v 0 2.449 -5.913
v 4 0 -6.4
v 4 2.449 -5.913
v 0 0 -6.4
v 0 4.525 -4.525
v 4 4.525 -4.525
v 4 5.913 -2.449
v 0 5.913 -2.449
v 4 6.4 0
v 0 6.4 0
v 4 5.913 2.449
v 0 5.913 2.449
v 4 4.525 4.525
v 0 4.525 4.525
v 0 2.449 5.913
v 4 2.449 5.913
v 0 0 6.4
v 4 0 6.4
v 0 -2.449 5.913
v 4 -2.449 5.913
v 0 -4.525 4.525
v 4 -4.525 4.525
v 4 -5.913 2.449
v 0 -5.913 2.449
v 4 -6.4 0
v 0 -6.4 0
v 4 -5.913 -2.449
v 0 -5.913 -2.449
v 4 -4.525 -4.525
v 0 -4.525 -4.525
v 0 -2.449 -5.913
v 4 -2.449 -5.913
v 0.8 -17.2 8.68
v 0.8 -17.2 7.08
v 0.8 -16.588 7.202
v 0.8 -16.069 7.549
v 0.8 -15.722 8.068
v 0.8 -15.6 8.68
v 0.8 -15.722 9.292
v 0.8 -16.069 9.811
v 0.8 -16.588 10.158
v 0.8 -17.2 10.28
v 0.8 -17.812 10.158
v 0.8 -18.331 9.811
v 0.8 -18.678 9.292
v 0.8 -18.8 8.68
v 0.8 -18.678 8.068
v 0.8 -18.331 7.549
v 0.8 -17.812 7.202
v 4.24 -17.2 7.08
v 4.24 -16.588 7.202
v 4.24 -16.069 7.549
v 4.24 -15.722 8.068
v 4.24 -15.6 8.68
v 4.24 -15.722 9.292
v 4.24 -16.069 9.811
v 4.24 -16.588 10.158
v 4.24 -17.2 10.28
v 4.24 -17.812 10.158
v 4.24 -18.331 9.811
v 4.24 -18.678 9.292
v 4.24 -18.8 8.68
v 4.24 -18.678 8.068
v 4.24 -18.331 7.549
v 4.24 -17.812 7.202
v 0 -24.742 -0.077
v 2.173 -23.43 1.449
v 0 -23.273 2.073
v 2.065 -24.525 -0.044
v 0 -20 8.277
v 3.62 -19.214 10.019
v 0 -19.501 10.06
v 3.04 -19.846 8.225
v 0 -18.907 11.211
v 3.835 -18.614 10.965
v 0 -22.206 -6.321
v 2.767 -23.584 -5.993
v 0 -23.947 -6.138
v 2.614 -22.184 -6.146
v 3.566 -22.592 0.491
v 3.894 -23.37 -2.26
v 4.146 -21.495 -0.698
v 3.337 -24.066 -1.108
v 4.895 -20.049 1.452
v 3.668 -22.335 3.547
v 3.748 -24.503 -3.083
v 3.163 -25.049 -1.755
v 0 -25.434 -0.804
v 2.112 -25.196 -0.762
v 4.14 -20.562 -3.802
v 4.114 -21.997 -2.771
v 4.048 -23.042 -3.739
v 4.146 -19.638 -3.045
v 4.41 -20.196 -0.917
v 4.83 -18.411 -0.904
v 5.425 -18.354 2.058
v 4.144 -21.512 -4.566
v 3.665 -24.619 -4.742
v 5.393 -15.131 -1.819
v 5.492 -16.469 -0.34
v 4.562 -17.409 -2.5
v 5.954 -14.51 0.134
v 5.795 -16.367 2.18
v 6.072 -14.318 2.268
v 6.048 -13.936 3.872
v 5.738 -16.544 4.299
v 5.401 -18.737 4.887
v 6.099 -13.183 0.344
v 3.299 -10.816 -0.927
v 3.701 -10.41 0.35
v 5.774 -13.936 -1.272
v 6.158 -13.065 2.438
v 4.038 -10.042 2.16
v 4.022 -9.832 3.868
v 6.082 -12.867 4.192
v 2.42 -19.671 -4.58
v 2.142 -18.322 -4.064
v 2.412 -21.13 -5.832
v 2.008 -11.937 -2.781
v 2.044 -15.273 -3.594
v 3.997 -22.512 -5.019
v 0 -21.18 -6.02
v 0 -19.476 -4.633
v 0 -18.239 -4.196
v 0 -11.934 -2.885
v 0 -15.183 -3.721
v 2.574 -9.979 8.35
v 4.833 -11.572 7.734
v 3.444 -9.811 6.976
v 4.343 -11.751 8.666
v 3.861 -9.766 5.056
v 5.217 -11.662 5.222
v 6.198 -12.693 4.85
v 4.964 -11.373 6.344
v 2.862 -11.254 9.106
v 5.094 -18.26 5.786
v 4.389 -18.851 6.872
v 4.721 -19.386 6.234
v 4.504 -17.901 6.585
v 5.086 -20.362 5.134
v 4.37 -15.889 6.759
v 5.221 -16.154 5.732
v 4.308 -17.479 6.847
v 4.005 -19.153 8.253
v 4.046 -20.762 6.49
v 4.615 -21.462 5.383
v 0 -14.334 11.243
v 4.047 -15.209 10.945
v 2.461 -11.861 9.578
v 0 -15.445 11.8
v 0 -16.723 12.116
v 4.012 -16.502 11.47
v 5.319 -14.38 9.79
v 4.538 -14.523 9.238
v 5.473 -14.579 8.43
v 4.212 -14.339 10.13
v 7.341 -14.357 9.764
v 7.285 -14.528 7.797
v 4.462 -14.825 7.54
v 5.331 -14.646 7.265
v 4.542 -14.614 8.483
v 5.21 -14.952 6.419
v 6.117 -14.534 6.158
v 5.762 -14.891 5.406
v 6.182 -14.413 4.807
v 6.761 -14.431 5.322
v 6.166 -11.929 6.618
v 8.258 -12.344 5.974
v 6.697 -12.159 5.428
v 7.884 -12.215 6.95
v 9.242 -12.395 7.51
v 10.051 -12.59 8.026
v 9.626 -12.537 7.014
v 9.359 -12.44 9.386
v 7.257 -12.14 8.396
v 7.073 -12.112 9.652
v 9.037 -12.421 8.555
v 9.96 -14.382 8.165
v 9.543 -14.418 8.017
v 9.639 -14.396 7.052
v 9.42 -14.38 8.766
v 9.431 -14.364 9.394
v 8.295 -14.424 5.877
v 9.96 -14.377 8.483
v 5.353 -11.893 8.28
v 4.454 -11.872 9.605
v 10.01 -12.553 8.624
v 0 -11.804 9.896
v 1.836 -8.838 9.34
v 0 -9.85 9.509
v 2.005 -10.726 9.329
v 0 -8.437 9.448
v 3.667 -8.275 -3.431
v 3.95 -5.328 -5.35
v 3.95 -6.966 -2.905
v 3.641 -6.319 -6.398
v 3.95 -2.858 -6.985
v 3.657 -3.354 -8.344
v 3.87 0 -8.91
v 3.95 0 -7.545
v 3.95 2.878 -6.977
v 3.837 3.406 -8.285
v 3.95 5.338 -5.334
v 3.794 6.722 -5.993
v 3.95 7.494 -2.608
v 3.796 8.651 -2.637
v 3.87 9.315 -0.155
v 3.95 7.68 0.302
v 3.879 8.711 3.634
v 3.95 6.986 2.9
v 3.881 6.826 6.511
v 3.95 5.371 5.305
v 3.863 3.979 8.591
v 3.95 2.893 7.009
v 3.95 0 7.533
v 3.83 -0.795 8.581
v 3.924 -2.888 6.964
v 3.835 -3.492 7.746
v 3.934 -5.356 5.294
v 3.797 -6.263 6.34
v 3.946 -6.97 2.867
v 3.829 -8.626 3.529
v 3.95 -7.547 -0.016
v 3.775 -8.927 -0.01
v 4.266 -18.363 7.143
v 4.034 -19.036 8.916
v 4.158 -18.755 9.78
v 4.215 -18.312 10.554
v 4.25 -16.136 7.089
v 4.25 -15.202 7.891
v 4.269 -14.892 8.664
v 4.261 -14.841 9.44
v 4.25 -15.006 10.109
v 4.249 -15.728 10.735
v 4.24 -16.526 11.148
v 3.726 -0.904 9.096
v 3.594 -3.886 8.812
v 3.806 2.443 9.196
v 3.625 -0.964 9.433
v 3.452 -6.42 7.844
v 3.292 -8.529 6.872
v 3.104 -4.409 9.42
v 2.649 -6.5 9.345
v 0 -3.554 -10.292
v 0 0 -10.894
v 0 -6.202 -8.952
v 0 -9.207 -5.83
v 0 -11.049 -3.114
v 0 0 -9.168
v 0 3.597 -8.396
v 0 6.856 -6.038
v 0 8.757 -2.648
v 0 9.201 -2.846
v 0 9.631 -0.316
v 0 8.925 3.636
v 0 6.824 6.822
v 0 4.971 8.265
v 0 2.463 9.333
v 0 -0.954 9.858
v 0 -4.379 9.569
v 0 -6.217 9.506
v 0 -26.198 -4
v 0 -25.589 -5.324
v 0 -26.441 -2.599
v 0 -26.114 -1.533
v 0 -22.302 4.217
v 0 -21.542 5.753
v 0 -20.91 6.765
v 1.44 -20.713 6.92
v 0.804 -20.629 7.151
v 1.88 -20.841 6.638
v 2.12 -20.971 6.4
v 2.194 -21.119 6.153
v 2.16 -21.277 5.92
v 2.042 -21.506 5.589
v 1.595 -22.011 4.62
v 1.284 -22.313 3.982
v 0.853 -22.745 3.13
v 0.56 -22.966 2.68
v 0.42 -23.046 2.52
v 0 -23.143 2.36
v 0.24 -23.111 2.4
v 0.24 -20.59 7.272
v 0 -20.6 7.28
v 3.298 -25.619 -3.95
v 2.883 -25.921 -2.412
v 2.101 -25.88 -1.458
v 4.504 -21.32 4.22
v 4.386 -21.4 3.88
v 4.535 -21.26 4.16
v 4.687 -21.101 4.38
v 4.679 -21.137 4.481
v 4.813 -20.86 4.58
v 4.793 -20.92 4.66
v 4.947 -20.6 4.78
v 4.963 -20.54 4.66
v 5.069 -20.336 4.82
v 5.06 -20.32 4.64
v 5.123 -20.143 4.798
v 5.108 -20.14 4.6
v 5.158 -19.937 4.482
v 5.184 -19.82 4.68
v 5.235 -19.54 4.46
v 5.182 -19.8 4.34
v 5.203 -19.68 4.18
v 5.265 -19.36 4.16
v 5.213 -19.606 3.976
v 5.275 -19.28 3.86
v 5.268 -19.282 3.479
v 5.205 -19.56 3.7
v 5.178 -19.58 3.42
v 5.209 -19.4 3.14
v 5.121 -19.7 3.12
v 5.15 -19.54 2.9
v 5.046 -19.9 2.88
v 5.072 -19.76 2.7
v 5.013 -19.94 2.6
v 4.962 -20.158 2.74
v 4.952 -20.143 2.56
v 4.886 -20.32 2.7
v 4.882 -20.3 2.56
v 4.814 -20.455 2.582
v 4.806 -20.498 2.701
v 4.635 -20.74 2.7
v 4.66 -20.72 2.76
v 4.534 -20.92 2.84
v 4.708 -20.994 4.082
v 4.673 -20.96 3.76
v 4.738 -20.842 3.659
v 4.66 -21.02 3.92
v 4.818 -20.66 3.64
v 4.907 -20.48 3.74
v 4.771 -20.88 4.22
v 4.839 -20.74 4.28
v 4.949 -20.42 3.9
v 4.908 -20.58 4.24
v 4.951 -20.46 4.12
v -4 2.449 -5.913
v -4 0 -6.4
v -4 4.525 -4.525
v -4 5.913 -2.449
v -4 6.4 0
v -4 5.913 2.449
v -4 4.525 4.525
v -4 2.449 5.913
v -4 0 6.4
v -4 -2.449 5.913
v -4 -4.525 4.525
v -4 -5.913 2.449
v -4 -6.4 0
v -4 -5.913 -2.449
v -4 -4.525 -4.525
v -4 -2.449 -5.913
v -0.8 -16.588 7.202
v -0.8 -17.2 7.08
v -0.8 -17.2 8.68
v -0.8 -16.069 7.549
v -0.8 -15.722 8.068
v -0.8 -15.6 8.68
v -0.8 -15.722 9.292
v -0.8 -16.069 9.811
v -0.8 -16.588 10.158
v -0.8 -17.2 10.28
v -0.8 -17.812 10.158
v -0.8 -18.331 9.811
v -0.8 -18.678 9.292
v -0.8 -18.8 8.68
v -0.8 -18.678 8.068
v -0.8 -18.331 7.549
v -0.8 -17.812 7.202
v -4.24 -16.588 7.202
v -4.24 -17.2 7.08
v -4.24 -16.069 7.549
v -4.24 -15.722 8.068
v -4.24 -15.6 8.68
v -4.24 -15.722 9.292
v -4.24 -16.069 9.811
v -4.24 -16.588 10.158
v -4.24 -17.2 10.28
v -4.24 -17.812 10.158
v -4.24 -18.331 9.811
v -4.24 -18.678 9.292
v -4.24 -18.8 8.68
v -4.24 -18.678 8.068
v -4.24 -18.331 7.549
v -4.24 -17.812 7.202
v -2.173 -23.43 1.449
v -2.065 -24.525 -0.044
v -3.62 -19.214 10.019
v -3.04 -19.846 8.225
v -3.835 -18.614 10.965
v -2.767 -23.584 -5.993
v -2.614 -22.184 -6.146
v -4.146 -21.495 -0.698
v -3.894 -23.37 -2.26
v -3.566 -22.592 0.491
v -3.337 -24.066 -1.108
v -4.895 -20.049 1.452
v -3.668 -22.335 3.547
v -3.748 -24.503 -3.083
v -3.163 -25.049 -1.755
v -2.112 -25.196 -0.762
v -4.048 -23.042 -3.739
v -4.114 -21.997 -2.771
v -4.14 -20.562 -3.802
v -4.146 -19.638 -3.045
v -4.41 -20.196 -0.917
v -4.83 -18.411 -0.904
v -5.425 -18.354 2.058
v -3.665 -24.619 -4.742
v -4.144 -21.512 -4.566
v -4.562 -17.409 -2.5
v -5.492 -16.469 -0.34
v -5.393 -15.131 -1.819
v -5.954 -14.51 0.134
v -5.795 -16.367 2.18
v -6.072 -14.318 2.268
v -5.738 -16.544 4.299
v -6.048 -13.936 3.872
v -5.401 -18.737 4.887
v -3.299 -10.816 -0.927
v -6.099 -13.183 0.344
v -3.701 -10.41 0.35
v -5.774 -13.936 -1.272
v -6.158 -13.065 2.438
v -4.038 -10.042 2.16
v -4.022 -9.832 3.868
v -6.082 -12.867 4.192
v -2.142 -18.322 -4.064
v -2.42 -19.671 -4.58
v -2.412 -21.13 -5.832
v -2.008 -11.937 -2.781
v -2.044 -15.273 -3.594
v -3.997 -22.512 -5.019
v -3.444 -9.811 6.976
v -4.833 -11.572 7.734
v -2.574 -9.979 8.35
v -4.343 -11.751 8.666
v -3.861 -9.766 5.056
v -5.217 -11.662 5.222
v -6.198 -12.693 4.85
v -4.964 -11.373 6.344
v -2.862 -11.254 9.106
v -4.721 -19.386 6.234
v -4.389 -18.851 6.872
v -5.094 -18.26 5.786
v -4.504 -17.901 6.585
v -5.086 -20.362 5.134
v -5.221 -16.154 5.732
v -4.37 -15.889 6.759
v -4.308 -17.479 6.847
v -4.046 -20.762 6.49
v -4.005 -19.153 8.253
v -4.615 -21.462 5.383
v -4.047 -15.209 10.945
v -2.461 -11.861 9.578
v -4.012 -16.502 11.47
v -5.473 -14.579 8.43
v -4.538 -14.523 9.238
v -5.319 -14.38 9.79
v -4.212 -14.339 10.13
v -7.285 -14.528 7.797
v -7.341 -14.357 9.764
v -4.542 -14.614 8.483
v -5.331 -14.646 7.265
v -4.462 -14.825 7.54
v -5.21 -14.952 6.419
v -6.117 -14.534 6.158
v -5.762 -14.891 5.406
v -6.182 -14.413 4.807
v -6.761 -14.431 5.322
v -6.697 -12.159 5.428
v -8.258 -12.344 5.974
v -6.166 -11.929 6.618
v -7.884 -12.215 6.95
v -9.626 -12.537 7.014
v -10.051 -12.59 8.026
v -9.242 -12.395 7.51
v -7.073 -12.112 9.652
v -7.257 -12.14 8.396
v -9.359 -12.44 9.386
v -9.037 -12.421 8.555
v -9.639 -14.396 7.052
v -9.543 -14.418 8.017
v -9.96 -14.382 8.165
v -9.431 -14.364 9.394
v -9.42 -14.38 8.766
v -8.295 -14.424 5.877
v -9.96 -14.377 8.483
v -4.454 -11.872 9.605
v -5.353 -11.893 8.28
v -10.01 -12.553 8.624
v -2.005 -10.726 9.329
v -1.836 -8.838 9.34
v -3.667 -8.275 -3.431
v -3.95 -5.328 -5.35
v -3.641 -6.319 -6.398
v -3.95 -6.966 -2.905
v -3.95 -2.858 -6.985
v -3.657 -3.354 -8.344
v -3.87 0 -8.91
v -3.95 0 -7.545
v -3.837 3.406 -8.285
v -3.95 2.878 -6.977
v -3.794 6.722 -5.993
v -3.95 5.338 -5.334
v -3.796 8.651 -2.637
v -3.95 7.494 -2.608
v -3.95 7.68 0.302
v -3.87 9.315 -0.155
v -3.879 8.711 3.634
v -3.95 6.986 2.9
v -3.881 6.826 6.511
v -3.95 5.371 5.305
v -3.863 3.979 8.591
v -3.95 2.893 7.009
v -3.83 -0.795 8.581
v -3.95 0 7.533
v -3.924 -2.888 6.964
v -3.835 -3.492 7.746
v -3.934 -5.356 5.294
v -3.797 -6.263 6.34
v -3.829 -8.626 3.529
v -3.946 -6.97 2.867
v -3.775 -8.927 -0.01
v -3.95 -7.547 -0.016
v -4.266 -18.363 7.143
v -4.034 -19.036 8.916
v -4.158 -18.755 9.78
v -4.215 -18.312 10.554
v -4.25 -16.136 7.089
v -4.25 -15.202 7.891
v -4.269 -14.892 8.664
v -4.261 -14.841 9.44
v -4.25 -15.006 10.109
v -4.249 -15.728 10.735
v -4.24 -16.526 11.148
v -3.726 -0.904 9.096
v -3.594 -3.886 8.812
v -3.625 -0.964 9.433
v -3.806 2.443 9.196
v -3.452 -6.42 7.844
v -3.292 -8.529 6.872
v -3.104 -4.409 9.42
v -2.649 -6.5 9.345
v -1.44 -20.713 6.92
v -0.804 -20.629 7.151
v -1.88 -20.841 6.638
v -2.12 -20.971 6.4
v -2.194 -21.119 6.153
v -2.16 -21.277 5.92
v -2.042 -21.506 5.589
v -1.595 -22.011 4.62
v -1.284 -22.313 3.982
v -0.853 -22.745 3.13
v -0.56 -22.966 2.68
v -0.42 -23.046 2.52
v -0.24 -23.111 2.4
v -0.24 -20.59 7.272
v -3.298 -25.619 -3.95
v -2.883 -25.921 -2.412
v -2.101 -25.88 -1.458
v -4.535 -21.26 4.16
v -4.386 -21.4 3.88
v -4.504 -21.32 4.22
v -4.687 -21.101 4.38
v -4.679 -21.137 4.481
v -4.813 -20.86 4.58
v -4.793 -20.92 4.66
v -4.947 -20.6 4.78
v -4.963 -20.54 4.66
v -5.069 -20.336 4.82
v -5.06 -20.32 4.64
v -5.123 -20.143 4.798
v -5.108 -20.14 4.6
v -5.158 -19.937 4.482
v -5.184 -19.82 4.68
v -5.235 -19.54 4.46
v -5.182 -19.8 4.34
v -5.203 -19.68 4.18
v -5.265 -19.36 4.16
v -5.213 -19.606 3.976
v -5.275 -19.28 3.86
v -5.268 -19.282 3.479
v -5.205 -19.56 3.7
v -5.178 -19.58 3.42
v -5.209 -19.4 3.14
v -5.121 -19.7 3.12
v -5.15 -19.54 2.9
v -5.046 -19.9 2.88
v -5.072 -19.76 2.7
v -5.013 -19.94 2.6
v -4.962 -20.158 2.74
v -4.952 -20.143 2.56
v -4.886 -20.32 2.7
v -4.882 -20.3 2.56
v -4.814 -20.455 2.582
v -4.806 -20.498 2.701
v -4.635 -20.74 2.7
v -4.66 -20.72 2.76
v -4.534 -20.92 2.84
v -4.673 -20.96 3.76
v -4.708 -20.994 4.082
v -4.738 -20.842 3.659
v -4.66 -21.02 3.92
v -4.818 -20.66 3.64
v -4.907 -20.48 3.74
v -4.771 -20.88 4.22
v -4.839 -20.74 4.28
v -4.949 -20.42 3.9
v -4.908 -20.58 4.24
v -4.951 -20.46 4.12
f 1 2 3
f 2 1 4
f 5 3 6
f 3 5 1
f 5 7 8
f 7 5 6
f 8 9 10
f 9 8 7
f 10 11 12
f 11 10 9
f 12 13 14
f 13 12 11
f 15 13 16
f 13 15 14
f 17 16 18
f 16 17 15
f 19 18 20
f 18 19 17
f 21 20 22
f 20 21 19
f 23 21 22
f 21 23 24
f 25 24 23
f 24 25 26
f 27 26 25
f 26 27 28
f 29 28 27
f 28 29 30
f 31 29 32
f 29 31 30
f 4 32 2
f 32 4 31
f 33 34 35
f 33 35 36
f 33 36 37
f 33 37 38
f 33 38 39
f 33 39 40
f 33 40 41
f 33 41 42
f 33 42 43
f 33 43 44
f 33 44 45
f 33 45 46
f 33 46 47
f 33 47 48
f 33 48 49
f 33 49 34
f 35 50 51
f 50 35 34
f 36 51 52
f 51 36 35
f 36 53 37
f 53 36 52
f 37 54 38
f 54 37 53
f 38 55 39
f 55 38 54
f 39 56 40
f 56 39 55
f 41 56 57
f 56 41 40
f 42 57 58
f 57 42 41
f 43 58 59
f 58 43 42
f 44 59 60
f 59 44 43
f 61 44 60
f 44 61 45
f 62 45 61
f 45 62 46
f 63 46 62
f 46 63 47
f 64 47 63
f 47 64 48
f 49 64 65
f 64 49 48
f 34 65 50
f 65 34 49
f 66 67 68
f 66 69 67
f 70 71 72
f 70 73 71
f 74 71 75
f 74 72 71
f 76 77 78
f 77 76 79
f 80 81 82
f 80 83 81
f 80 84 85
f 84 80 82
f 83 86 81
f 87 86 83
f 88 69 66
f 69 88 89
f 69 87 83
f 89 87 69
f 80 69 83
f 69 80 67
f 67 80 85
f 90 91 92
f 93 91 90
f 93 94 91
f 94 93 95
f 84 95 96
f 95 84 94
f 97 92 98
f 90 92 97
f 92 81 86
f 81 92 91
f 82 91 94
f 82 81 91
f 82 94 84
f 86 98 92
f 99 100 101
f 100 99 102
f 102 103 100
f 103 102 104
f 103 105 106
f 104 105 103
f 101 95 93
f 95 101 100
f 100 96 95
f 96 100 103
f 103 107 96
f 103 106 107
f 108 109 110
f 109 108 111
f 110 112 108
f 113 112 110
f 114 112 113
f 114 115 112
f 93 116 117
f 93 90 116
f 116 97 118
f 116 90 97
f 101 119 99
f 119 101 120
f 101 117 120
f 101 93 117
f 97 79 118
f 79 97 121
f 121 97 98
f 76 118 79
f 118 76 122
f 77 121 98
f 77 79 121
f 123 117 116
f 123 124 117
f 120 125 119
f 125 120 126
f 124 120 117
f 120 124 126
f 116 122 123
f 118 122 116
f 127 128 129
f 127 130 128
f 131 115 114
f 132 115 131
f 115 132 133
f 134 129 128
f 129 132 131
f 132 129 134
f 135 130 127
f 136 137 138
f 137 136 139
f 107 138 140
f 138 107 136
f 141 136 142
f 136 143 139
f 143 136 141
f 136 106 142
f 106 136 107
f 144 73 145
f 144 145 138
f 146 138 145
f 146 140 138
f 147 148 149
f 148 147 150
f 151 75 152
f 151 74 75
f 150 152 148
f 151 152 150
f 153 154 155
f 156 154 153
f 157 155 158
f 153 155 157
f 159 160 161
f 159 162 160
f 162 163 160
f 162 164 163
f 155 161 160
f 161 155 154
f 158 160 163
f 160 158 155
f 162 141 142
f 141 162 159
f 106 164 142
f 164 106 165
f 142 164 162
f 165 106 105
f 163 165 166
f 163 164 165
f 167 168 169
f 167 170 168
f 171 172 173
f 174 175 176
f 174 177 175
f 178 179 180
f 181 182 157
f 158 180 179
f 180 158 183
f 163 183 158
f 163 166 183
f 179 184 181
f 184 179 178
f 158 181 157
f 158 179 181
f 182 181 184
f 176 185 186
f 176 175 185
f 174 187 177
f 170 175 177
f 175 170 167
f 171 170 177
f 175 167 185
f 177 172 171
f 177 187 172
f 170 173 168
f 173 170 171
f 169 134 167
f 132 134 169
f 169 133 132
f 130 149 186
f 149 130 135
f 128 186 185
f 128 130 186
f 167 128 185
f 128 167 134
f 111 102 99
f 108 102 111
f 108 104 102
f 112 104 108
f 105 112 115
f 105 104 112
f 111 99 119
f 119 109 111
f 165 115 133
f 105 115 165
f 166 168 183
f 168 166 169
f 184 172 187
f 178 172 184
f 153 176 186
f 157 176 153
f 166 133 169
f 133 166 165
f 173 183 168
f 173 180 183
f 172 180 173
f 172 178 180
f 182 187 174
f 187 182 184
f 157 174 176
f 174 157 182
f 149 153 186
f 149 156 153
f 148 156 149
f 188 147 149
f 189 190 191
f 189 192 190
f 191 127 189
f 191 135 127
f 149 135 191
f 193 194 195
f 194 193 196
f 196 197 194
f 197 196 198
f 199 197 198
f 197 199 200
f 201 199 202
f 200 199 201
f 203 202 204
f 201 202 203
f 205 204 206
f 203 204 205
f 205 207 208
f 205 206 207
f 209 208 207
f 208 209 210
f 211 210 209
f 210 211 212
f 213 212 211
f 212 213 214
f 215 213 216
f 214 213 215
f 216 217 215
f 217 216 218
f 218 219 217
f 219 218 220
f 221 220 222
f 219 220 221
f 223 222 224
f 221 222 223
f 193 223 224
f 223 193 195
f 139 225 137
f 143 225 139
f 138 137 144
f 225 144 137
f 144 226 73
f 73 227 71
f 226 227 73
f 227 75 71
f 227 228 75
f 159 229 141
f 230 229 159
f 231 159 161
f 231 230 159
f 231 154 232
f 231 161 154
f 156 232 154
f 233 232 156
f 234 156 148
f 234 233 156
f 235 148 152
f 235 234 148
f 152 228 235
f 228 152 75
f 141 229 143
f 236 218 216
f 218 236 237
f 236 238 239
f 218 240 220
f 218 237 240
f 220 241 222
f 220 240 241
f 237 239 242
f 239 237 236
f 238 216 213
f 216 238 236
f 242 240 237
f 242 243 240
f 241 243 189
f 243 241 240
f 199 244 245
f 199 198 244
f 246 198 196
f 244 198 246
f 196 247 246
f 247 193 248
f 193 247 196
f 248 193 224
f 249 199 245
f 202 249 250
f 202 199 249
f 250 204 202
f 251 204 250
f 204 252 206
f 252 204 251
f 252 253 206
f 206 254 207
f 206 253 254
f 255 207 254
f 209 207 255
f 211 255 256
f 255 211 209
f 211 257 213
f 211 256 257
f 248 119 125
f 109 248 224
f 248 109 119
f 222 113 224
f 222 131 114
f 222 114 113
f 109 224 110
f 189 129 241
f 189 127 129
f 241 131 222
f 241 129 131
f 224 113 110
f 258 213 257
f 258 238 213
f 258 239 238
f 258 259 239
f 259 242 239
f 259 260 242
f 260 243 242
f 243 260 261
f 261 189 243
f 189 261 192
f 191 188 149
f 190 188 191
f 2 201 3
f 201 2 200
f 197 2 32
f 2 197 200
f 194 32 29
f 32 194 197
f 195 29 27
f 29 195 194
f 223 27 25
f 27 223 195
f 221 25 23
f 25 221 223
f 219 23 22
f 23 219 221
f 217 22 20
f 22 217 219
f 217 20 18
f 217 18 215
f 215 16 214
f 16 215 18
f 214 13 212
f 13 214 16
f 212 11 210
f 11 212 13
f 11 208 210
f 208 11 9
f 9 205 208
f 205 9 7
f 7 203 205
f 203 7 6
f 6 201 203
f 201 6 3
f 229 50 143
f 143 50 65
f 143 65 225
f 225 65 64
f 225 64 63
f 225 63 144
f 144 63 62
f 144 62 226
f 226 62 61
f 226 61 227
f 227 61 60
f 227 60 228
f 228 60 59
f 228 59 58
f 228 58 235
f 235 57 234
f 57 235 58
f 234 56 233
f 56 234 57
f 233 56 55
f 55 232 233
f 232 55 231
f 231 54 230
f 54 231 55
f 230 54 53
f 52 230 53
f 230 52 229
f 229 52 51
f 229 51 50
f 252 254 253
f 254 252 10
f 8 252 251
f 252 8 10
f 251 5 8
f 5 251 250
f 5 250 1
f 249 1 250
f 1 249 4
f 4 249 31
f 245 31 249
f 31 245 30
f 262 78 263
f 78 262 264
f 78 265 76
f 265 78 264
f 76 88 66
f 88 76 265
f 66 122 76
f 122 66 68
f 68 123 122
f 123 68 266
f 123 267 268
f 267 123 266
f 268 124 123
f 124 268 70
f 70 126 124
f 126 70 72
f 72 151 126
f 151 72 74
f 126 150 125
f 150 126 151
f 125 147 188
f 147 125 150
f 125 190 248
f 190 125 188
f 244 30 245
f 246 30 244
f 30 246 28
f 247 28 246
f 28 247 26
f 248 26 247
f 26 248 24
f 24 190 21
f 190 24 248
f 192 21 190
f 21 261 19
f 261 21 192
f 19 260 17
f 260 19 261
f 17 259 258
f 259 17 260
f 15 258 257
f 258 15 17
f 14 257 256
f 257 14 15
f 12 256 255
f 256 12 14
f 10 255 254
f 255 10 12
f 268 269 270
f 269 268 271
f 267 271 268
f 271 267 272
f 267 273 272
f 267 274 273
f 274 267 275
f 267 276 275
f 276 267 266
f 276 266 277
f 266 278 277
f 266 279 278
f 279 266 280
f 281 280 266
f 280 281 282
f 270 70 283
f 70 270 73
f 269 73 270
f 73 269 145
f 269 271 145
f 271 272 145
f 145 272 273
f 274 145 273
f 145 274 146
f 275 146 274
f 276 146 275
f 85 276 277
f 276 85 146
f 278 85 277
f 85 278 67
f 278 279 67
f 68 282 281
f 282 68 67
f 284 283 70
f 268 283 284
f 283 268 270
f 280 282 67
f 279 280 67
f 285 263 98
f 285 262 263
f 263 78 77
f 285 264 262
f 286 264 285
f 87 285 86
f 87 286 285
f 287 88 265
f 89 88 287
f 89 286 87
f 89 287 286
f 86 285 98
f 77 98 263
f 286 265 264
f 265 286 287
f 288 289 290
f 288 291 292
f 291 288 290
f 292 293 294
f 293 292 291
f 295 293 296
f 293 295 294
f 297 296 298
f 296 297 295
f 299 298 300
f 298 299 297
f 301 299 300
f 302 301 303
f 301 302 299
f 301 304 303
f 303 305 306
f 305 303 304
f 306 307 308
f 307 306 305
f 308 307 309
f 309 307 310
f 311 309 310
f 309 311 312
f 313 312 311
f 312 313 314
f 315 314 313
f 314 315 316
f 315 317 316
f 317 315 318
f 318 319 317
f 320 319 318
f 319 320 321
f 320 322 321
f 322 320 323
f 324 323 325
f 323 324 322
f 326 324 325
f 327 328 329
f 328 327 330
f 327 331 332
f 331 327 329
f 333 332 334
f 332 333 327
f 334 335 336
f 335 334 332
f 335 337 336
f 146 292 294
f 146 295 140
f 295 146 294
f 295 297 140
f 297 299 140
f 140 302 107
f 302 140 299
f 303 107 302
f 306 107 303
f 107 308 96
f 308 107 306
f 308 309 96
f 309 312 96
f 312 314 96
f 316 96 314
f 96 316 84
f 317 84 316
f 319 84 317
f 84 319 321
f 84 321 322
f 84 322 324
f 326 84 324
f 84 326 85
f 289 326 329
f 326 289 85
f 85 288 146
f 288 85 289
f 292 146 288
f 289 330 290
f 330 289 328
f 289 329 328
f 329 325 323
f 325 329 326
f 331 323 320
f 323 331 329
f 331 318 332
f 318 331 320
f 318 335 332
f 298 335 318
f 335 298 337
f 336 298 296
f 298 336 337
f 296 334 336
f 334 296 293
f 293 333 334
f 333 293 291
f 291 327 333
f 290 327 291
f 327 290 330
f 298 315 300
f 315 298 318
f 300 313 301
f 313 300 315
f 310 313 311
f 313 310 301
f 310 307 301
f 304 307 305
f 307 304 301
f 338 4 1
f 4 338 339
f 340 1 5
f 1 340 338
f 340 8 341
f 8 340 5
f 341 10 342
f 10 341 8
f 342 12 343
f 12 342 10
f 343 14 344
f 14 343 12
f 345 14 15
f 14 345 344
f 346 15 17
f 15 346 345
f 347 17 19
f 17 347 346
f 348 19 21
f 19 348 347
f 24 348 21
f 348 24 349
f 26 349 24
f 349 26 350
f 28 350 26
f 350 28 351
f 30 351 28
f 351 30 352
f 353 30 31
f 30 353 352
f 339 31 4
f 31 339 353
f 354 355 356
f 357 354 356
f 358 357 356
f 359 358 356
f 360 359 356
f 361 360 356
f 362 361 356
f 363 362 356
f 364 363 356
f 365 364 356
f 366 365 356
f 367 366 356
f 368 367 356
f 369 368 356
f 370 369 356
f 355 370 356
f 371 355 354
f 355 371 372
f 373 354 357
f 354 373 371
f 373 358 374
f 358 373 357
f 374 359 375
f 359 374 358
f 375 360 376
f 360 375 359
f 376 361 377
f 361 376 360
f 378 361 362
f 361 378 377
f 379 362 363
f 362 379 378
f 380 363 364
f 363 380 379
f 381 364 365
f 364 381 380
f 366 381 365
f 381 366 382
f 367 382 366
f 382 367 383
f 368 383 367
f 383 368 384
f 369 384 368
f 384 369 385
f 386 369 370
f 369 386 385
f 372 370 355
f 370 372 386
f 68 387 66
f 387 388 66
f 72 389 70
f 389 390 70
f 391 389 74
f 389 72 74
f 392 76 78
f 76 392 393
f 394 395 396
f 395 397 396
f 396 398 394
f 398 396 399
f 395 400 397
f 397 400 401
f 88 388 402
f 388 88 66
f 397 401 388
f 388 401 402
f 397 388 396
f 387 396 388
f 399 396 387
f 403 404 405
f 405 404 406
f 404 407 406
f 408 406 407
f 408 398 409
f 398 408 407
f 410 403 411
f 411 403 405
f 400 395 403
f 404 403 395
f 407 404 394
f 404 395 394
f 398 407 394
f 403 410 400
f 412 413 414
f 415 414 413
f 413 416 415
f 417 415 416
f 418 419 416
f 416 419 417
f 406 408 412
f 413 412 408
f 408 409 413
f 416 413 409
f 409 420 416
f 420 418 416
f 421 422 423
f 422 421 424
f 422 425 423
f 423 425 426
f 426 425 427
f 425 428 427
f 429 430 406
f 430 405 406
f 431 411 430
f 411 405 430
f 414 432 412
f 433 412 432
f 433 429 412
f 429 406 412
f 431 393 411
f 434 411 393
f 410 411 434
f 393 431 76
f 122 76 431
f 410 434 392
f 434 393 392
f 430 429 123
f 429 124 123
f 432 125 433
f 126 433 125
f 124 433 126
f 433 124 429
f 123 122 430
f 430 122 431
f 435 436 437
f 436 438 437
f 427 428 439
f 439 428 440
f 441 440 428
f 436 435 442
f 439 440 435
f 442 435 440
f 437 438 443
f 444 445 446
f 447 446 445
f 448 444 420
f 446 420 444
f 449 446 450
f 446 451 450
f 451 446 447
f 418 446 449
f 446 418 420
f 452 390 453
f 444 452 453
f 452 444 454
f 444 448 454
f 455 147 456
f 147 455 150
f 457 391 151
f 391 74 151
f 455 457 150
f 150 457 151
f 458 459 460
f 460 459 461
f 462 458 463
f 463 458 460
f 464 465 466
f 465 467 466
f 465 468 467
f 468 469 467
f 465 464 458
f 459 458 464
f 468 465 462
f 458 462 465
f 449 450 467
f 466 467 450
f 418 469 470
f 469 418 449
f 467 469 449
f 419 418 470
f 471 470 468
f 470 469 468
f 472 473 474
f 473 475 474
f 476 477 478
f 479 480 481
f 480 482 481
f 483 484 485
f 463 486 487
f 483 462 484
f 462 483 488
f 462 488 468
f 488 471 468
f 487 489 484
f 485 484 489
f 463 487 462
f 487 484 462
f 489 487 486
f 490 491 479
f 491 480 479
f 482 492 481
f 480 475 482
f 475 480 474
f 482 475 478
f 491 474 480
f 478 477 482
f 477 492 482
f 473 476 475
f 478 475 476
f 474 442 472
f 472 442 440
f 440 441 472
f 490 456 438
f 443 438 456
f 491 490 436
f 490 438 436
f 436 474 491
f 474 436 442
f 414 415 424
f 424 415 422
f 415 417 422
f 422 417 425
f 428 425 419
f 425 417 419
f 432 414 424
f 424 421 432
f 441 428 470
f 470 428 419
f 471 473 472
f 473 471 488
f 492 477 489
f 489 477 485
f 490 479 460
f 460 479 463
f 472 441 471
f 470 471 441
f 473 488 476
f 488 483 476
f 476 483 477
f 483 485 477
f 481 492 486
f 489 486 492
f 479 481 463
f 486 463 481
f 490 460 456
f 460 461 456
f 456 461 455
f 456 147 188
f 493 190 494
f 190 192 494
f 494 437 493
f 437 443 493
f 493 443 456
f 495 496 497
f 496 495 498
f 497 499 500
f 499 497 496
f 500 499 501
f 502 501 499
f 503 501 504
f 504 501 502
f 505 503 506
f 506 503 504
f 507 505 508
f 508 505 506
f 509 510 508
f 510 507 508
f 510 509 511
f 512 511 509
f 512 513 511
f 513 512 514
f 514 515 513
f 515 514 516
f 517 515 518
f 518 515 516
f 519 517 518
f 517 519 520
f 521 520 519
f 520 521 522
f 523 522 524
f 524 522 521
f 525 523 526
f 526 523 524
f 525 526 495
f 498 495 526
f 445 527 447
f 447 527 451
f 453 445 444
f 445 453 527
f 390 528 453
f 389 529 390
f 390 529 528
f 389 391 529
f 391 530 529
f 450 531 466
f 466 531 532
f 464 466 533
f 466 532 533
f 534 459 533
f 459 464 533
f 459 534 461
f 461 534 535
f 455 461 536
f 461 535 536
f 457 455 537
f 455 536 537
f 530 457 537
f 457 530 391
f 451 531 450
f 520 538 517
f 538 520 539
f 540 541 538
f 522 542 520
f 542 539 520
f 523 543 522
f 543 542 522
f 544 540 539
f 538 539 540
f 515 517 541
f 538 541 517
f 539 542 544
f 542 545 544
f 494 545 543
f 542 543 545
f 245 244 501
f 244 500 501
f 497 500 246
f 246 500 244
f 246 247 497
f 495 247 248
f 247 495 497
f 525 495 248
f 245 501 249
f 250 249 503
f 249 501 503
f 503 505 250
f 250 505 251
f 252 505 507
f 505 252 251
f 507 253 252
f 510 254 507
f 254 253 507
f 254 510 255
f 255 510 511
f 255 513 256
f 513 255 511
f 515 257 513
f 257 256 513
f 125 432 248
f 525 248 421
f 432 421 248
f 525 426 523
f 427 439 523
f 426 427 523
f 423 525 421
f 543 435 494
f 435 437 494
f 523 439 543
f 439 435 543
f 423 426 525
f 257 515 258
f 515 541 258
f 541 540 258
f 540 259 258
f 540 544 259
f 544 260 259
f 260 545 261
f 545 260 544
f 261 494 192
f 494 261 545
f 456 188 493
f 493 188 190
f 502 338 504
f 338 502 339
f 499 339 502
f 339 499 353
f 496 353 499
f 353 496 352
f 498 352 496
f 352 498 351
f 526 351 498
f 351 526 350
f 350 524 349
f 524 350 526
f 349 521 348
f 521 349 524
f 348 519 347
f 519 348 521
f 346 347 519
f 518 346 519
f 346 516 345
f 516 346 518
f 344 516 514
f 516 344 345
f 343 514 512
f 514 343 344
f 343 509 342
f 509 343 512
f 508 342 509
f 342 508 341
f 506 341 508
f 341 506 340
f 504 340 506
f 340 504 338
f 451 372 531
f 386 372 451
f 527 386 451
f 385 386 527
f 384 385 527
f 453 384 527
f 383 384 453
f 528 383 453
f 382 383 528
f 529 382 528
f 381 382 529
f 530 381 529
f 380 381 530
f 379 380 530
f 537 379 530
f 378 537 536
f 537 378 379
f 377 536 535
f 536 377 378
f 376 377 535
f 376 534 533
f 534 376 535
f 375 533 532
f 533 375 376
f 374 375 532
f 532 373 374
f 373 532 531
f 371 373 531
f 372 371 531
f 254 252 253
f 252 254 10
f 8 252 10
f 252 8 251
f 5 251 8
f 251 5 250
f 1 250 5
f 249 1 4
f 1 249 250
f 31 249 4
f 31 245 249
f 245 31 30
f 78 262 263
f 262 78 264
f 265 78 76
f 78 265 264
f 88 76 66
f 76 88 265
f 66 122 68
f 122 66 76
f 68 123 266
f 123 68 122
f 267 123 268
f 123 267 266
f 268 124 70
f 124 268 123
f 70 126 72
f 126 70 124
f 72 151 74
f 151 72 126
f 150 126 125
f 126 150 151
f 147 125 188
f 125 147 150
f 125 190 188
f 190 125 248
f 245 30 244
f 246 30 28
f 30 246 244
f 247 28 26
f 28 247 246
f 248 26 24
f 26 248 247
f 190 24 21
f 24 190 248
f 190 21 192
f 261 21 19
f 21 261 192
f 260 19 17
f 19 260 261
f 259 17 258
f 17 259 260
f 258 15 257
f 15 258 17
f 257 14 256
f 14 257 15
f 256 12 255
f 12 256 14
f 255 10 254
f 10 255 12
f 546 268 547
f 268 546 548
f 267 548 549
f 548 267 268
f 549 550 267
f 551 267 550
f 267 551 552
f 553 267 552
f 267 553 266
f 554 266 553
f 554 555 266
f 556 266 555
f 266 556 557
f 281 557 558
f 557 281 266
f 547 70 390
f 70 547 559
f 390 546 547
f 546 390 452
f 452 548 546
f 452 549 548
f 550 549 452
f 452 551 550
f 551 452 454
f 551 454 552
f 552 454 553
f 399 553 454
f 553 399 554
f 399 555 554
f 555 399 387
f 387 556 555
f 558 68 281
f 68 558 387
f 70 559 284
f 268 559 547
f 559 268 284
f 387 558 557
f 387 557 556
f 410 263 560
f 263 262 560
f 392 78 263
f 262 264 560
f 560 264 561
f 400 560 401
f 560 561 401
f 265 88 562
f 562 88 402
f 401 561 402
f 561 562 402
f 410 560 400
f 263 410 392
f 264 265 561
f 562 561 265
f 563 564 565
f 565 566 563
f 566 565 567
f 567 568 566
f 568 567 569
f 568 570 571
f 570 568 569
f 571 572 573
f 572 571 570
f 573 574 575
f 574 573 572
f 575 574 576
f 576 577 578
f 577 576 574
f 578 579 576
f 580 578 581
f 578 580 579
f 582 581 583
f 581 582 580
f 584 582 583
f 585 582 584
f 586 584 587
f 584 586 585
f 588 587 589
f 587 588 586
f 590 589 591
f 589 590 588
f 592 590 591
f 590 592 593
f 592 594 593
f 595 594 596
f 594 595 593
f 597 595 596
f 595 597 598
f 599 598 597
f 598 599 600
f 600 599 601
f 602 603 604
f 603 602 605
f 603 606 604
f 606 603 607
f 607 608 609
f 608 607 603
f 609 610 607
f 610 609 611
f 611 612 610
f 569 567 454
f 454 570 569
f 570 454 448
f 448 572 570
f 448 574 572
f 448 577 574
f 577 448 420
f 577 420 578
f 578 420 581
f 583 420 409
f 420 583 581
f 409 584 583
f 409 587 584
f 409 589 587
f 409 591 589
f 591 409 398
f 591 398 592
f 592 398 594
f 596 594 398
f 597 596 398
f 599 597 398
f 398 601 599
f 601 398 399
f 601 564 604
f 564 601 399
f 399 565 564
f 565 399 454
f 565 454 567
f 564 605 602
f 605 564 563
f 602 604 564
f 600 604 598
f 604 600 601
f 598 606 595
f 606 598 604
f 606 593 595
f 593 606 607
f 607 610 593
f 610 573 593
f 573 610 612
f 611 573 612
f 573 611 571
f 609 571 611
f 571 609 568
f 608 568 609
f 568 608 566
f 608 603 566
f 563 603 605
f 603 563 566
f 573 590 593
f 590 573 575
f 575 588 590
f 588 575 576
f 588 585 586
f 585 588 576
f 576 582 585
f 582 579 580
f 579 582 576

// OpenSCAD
use <../lib.scad>
use <64780p02.scad>
use <64835p02.scad>
$fa=1; $fs=0.2;
function ldraw_lib__64835p02c01(realsolid=false) = [
// 0 Animal Cow Head with White Eyes and Blaze Pattern
// 0 Name: 64835p02c01.dat
// 0 Author: Philippe Hurbain [Philo]
// 0 !LDRAW_ORG Shortcut UPDATE 2015-01
// 0 !LICENSE Licensed under CC BY 2.0 and CC BY 4.0 : see CAreadme.txt
// 
// 0 !HELP Horns coordinates: X=+/-10.6, Y=-21.7 , Z=-43
// 
// 0 BFC CERTIFY CCW
  [0,"BFC","CERTIFY"],
  [0,"BFC","CCW"],
// 
// 0 !HISTORY 2013-12-19 {LEGO Digital Designer} Original part shape
// 0 !HISTORY 2013-12-19 [Philo] File preparation for LDraw Parts Tracker
// 0 !HISTORY 2015-10-11 [PTadmin] Official Update 2015-01
// 
// 
// 1 16 0 0 0 1 0 0 0 1 0 0 0 1 64835p02.dat
  [1,16,0,0,0,1,0,0,0,1,0,0,0,1, ldraw_lib__64835p02(realsolid)],
// 1 16 0 0 0 1 0 0 0 1 0 0 0 1 64780p02.dat
  [1,16,0,0,0,1,0,0,0,1,0,0,0,1, ldraw_lib__64780p02(realsolid)],
];
module ldraw_lib__64835p02c01(step=0, col=false, unit=2/5, alt=false, line=0.2, solid=!$preview)
    makepoly(ldraw_lib__64835p02c01(solid), step=step, col=col, unit=unit, alt=alt, line=line, solid=solid);
ldraw_lib__64835p02c01(line=0.2);
